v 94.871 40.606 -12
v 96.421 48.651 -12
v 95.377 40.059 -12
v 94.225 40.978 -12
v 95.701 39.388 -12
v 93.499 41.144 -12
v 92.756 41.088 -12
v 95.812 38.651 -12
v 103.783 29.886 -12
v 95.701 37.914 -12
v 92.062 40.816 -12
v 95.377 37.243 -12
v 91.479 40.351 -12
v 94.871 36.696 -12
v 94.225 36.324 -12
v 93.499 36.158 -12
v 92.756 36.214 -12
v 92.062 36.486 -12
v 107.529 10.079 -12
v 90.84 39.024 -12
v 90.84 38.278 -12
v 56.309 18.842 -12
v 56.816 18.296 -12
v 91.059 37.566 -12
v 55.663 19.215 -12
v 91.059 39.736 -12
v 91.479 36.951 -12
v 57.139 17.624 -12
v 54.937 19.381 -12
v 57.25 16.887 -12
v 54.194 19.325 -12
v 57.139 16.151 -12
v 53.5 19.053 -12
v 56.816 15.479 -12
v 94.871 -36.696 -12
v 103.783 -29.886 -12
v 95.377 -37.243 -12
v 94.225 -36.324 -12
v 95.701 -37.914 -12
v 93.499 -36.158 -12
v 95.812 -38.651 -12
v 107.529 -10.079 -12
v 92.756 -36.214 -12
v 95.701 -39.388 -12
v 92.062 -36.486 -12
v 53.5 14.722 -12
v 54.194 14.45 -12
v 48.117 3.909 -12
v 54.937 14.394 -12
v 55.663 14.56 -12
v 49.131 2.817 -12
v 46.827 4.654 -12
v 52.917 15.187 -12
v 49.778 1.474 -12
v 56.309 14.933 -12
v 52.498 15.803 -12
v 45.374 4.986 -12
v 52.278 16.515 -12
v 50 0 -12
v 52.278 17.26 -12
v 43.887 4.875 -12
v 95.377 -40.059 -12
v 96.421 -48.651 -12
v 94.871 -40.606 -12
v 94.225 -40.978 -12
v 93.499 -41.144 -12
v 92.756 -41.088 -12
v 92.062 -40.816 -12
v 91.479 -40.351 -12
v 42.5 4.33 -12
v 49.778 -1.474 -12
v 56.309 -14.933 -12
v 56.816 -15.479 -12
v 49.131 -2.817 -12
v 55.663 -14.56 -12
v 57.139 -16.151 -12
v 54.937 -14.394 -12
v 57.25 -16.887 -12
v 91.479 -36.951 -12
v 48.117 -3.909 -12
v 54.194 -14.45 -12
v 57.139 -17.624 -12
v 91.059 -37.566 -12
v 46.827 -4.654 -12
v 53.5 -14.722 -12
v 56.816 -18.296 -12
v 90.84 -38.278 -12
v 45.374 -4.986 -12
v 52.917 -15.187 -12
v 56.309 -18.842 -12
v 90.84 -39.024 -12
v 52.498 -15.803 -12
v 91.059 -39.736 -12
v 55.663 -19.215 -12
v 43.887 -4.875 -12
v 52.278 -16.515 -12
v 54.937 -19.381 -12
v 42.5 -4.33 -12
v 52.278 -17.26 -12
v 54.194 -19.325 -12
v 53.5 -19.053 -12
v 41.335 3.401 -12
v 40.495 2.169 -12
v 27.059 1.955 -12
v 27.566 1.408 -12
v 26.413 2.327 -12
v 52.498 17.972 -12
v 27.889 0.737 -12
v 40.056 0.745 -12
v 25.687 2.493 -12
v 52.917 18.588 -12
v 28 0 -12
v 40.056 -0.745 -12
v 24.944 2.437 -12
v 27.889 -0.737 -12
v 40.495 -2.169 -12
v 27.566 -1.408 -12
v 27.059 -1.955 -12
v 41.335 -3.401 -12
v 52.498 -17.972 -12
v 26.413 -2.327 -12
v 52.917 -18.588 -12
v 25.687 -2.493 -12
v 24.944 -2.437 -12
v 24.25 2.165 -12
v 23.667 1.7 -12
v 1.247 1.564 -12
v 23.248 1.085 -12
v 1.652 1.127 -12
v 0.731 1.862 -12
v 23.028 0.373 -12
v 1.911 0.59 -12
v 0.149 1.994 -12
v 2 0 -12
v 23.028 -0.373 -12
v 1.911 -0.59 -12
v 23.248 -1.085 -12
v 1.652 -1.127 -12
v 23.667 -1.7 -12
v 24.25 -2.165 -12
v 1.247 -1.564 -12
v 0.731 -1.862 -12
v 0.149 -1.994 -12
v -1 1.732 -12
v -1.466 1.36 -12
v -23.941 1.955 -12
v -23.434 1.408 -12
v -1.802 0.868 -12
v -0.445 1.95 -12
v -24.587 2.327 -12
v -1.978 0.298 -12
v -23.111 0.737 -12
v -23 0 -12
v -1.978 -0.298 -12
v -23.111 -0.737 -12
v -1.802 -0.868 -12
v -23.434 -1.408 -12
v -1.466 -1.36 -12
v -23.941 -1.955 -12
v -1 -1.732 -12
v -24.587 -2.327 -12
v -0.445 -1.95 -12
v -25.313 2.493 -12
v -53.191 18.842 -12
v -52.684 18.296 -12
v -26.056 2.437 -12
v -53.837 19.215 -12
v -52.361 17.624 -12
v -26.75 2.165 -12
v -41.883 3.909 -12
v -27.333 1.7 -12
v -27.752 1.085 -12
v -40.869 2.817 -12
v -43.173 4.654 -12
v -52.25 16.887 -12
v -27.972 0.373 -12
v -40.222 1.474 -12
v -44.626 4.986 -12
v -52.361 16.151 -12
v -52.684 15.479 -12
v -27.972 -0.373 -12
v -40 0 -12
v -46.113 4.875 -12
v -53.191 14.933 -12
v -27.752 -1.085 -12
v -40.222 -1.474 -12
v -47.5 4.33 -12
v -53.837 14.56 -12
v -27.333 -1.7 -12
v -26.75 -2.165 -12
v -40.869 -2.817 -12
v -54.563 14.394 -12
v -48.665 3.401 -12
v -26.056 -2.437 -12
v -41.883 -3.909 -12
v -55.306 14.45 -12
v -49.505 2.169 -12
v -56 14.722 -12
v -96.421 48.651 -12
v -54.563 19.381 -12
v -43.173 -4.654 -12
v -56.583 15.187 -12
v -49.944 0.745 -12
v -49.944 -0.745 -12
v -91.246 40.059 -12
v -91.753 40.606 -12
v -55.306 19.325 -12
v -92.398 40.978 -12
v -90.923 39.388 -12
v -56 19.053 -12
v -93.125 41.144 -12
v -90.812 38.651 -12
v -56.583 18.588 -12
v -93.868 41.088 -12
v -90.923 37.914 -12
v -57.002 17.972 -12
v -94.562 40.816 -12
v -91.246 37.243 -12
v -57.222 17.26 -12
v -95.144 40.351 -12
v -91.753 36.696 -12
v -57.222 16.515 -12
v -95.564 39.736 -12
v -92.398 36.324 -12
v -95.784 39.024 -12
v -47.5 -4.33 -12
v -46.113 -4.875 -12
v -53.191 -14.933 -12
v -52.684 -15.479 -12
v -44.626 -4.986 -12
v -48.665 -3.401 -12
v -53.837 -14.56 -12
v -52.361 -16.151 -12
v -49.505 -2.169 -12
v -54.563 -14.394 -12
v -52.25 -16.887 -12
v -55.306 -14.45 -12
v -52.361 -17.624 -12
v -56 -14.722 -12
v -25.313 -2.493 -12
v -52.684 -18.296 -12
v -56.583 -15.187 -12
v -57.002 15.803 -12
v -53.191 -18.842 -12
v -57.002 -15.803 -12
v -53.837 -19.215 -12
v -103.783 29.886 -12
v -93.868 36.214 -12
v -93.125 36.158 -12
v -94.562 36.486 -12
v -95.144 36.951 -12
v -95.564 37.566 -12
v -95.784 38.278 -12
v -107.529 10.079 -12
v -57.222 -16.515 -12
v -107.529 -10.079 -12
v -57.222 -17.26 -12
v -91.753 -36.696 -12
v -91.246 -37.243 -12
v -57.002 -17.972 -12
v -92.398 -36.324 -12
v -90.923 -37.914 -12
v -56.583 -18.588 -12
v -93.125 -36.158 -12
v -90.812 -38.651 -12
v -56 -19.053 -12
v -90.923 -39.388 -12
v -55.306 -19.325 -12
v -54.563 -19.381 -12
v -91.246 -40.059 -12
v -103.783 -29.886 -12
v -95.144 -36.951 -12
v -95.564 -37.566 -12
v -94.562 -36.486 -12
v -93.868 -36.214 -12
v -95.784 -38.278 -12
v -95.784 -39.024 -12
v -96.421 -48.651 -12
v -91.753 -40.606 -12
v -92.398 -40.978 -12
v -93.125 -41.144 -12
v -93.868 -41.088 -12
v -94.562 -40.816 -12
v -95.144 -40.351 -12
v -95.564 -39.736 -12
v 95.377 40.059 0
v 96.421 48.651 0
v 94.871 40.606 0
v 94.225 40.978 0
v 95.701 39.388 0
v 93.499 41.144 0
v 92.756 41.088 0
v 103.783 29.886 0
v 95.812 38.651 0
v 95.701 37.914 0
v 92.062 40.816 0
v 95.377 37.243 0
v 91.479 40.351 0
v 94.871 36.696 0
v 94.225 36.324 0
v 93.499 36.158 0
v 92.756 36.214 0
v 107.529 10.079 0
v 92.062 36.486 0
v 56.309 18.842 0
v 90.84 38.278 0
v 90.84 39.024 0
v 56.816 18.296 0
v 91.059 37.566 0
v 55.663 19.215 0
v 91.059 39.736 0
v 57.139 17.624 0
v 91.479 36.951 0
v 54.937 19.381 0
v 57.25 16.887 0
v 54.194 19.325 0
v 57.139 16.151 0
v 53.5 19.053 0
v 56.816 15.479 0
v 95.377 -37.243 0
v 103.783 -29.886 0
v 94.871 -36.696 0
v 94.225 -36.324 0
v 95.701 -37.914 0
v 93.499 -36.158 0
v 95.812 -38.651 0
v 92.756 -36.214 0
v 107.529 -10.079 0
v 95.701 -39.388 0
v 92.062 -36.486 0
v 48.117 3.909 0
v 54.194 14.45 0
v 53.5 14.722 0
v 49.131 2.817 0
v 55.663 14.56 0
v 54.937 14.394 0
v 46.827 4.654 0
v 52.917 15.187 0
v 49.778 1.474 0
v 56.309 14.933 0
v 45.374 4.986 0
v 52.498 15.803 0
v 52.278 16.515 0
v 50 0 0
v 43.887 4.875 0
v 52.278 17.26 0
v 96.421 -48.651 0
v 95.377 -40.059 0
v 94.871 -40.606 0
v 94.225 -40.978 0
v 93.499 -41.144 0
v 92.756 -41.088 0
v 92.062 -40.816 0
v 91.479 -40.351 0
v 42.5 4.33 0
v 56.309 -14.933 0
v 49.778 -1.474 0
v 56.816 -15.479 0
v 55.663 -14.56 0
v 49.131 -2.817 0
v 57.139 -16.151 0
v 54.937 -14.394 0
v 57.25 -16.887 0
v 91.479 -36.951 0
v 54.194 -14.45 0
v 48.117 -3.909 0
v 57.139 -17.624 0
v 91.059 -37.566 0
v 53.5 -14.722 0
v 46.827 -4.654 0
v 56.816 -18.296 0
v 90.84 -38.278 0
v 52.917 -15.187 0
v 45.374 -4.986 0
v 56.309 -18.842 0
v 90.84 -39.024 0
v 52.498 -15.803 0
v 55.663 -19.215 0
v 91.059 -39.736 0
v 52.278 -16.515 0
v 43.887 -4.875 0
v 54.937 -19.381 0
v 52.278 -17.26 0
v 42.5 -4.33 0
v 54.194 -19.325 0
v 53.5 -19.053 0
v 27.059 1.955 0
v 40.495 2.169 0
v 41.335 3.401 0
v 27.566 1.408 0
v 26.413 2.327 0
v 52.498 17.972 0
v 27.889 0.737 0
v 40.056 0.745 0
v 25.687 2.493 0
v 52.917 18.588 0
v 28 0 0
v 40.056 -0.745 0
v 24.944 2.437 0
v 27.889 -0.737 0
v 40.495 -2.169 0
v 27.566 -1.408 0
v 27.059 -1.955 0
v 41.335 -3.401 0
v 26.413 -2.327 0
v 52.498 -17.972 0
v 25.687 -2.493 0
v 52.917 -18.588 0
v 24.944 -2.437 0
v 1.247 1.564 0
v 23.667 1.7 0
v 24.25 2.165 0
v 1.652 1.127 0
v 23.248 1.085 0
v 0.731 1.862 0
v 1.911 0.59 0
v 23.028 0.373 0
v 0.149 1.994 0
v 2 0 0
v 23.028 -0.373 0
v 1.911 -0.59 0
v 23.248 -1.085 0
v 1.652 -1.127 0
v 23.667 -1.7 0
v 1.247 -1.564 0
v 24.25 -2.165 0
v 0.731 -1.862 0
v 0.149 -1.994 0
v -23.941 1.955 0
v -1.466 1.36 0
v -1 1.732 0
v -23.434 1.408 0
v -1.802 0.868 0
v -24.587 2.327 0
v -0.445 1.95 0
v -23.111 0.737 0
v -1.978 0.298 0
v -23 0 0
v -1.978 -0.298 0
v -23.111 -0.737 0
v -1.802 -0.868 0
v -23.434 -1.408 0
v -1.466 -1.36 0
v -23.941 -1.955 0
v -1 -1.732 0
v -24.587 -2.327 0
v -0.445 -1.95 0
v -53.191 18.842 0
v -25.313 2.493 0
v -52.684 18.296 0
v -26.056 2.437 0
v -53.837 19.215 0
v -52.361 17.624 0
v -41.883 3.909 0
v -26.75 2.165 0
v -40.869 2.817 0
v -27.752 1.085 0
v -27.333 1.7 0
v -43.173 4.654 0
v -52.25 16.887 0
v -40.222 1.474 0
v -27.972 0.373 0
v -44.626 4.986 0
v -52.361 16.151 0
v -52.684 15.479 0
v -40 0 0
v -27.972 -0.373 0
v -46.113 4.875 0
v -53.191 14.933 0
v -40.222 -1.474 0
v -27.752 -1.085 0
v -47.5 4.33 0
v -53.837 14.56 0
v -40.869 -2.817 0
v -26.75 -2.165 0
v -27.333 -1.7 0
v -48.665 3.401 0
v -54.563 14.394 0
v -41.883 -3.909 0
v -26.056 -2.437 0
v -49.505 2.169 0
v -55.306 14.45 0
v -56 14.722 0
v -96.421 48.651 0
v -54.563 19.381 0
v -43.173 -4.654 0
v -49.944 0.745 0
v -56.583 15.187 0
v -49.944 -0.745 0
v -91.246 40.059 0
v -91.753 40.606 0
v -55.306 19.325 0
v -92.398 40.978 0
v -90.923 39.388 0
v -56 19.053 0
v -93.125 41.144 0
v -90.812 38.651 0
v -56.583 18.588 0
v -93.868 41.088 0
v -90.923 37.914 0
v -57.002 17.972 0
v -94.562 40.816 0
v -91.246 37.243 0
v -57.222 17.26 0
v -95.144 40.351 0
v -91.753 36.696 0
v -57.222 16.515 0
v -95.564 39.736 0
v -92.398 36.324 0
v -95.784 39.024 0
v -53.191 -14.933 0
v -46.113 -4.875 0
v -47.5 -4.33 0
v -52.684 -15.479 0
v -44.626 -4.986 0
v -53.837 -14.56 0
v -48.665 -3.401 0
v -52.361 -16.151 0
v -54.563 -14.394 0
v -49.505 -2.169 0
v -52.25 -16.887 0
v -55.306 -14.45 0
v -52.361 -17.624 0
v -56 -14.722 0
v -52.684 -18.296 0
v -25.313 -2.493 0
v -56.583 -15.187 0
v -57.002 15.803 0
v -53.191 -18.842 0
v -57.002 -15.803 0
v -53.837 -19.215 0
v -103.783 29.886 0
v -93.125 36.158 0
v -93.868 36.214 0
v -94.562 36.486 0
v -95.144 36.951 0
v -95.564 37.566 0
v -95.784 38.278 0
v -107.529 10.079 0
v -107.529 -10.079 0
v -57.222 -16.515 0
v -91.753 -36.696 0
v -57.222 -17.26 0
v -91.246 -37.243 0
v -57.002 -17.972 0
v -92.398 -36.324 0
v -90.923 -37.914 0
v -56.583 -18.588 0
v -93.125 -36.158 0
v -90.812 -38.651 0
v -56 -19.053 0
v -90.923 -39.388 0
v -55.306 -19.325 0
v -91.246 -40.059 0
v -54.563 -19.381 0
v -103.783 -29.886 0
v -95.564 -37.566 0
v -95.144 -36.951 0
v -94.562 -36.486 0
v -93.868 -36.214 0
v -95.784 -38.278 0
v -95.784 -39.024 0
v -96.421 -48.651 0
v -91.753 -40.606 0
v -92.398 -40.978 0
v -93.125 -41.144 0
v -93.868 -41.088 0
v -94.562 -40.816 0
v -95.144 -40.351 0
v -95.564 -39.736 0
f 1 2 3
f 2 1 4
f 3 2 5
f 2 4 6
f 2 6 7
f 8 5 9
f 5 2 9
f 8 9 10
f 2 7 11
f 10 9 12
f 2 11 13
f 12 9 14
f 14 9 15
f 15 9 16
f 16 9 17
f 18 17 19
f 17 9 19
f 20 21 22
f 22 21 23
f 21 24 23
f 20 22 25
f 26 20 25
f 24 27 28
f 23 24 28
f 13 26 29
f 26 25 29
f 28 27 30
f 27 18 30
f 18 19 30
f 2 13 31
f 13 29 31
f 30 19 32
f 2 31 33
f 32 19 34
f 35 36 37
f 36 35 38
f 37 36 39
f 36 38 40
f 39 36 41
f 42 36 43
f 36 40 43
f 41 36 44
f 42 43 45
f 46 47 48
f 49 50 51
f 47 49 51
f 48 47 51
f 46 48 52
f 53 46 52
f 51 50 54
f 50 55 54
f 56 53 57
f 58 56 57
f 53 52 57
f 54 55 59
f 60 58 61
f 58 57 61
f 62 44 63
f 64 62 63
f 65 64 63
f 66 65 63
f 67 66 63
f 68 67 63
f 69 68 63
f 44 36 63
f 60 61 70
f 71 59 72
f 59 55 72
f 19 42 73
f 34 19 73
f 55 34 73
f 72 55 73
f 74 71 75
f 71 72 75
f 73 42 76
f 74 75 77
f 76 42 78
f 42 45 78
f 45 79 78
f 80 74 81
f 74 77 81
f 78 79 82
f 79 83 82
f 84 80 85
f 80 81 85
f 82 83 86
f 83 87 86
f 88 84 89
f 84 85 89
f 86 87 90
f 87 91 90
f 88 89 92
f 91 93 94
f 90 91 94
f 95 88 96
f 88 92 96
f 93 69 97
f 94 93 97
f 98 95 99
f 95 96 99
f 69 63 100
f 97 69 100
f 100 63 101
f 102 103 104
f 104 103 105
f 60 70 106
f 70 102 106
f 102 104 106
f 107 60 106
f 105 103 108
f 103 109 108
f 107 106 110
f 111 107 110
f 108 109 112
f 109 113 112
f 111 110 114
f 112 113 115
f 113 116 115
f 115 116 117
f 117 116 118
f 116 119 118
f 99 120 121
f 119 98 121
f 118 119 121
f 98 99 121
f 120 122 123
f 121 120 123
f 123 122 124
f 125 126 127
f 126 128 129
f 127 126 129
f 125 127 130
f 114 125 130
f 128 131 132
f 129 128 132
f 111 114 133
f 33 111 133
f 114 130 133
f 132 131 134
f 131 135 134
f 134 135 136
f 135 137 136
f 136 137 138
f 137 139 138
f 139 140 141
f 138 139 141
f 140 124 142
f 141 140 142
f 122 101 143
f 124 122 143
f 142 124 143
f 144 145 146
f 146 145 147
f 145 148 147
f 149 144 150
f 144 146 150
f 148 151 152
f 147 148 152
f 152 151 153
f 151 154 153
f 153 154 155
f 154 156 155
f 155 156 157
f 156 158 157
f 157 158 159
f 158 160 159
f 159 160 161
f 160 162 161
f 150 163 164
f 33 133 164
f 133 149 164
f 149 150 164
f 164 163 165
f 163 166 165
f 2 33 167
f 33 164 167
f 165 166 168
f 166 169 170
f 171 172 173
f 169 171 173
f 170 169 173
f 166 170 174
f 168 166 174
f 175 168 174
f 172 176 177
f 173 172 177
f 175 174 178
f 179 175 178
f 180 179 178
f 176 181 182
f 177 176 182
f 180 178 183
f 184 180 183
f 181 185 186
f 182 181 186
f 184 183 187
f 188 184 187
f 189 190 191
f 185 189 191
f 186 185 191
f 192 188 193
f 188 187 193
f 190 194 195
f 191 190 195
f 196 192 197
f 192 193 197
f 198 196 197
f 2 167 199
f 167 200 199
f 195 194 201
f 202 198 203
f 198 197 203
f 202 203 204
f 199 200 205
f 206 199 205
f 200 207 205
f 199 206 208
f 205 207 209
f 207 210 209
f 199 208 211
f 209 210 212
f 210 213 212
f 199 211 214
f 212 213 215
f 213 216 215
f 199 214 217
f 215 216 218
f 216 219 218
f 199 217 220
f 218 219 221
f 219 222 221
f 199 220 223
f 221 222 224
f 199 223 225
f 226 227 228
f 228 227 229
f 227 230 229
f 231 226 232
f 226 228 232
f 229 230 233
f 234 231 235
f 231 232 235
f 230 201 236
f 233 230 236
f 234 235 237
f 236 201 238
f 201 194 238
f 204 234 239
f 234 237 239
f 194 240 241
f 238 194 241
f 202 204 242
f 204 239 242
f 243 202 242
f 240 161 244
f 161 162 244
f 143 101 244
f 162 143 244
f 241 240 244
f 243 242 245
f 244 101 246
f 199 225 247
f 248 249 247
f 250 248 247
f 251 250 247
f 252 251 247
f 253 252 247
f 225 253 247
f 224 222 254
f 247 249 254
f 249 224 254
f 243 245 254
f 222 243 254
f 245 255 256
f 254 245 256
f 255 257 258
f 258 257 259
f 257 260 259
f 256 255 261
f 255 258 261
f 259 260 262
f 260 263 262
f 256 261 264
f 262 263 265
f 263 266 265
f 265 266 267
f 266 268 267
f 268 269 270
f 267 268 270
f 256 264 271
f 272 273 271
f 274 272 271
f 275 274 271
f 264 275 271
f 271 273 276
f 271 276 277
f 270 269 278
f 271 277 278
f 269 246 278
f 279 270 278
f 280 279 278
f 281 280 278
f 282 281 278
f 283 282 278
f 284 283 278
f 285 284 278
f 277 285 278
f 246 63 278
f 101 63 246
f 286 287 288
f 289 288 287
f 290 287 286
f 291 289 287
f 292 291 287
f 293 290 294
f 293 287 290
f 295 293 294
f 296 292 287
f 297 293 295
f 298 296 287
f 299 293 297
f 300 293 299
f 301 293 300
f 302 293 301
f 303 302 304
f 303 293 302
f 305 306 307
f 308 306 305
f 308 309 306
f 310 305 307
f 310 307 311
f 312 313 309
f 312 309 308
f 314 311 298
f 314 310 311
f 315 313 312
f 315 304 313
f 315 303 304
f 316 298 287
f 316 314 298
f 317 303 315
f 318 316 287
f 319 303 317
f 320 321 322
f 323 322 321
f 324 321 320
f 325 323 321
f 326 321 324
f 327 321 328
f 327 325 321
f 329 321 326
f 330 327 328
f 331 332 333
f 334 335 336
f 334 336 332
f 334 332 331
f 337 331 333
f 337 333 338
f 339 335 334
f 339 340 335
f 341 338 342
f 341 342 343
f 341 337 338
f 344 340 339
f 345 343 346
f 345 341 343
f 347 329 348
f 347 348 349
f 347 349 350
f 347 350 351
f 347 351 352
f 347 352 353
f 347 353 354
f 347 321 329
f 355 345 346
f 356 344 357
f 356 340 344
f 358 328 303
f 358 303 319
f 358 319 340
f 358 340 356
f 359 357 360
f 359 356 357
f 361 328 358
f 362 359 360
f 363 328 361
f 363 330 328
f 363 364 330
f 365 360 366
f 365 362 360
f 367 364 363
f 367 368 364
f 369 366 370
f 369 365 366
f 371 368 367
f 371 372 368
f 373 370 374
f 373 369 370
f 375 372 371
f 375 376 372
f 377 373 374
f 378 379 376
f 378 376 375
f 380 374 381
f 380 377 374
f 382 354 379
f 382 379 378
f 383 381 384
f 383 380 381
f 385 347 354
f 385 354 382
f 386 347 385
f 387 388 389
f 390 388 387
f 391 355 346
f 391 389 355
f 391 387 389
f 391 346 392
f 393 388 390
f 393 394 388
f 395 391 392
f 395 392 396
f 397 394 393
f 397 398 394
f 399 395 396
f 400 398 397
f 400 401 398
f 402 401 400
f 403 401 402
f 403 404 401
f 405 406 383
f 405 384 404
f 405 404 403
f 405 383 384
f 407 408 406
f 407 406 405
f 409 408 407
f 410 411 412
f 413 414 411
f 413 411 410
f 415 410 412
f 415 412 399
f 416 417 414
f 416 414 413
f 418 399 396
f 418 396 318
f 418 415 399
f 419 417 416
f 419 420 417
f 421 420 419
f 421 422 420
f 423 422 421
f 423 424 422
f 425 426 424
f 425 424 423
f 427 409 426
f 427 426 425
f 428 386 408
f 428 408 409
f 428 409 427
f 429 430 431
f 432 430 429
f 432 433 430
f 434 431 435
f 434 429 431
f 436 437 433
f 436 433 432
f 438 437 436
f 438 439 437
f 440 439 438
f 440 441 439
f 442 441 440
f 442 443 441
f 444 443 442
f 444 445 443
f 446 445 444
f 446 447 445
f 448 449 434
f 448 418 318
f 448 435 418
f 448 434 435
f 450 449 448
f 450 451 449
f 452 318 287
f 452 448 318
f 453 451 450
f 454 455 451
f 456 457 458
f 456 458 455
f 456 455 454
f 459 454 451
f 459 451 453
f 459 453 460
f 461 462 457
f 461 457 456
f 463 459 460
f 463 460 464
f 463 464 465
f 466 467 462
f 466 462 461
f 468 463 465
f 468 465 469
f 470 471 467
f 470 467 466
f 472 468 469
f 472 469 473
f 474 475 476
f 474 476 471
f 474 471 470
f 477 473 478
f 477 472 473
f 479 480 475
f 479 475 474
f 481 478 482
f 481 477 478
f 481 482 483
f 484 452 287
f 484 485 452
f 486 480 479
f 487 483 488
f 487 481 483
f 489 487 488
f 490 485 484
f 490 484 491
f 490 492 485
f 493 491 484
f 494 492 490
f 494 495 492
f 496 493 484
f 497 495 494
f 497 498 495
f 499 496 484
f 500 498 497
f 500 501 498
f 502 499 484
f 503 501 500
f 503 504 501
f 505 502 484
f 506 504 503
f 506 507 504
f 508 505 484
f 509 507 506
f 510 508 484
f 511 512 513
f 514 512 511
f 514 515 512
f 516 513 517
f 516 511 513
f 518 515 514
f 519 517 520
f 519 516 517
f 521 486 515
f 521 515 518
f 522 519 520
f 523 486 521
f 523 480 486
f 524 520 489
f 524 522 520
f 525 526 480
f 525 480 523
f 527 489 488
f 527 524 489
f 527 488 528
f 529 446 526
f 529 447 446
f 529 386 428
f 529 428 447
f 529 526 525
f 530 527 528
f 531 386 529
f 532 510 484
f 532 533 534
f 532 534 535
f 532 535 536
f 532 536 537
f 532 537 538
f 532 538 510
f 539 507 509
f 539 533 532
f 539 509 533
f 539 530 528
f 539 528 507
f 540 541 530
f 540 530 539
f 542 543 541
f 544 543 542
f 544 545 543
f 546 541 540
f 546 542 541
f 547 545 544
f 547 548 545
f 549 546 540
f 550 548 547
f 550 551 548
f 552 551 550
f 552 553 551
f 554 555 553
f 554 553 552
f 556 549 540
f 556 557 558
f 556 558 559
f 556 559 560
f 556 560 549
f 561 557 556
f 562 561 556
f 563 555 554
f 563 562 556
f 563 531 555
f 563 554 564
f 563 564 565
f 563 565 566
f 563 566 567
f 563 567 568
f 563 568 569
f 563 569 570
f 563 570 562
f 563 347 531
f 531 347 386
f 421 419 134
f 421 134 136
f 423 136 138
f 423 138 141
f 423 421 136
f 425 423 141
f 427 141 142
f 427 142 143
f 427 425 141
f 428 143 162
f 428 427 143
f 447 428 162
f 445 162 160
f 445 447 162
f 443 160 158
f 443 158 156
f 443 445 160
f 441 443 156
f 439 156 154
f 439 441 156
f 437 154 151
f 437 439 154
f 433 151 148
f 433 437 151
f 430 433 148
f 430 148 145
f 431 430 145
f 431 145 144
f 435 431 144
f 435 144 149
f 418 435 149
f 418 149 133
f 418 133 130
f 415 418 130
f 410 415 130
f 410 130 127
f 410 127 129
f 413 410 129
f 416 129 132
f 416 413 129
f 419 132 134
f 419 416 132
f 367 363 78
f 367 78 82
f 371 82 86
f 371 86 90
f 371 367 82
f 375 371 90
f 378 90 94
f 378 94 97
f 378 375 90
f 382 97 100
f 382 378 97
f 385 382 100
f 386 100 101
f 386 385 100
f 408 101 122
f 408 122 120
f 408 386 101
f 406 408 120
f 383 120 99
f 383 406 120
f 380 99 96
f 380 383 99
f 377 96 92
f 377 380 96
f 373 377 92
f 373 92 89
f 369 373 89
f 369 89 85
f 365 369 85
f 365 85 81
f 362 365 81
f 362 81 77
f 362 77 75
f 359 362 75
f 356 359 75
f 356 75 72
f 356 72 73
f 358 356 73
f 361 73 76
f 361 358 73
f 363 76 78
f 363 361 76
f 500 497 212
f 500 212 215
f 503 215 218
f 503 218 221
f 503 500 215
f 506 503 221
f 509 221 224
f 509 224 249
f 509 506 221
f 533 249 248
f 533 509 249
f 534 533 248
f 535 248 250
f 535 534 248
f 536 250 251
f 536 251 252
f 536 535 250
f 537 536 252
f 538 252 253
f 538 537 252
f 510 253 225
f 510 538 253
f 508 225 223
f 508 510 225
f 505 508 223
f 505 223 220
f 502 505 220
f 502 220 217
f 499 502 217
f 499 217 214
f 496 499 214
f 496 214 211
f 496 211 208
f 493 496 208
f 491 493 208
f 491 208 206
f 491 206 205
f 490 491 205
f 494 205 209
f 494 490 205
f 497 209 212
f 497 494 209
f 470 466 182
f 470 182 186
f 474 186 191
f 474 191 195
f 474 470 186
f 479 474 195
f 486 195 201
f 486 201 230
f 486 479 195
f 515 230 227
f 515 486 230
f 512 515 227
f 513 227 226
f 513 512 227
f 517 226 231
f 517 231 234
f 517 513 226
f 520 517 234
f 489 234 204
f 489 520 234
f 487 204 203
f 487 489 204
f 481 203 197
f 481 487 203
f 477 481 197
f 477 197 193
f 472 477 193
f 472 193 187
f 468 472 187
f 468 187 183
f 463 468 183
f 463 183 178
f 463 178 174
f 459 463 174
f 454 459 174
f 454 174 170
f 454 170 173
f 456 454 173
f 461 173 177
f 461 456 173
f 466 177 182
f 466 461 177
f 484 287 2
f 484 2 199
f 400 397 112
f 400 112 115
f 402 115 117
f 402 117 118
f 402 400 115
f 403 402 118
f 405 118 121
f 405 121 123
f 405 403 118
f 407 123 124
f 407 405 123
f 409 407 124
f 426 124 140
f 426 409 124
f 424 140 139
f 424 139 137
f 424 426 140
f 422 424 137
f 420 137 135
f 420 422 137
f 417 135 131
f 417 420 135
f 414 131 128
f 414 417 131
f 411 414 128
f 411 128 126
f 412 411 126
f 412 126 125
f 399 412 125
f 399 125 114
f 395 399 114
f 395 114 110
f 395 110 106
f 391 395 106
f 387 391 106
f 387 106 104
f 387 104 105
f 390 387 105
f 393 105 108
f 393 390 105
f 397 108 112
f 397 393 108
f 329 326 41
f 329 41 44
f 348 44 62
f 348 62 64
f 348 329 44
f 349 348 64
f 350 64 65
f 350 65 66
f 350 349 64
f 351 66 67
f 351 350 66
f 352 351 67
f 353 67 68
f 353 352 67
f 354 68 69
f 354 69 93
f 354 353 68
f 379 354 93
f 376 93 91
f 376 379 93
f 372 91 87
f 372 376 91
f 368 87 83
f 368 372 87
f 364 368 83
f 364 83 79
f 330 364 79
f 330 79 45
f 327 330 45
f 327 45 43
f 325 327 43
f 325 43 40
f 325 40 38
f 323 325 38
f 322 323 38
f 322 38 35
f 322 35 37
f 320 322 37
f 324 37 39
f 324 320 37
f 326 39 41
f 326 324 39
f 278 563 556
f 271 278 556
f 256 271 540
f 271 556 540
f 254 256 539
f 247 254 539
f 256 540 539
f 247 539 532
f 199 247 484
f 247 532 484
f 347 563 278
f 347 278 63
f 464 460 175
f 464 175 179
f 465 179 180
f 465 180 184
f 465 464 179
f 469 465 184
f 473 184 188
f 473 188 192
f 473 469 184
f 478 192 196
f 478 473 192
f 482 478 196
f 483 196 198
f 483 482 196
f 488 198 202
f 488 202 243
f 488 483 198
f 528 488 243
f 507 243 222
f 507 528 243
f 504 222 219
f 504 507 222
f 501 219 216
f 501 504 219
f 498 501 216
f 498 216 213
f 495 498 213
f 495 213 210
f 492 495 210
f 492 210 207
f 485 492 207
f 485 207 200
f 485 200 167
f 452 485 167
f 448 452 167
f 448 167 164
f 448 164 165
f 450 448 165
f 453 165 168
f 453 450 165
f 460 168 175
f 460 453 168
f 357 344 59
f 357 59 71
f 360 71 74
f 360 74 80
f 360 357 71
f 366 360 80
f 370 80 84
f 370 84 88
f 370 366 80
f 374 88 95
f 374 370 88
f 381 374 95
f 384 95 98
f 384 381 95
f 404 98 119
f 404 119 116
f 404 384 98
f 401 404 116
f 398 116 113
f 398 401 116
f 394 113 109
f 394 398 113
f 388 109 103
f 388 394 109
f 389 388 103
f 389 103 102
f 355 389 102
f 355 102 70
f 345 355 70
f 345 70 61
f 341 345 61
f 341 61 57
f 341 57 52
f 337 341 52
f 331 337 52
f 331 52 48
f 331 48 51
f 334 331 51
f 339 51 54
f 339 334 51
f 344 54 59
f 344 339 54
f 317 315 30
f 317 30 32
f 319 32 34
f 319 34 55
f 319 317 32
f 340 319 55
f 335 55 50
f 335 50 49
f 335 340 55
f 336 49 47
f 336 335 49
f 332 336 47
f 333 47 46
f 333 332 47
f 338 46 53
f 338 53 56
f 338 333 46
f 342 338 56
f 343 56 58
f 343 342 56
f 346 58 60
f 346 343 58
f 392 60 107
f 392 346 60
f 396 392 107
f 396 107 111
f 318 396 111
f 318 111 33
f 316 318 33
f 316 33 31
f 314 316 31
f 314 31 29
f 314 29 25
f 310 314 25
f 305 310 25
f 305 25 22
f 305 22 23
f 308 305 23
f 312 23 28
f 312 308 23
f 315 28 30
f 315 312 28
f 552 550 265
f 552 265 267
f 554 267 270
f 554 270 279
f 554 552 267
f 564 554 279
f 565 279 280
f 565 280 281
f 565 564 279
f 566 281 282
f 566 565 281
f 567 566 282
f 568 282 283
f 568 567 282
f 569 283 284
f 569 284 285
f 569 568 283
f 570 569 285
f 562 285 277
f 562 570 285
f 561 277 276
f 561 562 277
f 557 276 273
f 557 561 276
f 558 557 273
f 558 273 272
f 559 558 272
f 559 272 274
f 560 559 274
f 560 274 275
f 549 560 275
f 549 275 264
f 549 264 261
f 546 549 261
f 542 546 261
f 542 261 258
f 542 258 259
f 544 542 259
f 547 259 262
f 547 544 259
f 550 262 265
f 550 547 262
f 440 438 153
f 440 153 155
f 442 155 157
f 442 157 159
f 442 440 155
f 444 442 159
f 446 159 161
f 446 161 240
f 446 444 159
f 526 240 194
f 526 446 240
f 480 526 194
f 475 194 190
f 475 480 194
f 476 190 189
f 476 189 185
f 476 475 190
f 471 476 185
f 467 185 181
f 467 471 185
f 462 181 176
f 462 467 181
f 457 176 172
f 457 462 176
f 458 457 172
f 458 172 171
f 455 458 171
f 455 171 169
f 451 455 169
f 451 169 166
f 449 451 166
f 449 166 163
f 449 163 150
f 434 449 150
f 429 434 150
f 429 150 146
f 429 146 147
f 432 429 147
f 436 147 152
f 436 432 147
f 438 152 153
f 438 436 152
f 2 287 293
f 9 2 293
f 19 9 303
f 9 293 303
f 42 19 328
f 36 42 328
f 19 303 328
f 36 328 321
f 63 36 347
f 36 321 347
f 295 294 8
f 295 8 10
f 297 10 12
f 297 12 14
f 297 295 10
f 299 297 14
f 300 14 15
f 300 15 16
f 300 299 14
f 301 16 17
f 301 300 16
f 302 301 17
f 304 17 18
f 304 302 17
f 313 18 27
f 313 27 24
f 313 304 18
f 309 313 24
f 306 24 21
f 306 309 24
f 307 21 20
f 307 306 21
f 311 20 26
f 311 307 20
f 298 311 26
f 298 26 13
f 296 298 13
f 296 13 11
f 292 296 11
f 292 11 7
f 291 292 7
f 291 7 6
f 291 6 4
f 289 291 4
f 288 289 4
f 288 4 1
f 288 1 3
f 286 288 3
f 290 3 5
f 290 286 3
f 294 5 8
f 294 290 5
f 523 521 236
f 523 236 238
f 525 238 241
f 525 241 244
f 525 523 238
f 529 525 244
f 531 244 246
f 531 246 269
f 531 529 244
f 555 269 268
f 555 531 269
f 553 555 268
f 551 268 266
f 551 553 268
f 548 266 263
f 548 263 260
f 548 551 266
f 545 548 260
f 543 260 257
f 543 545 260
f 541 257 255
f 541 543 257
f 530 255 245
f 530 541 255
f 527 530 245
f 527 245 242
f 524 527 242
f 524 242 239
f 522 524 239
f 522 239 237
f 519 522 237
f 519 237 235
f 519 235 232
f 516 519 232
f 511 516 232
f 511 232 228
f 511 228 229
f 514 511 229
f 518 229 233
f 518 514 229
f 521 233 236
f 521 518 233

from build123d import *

# Parameters (mm, degrees)
SKETCH001_R   = 2.5
SKETCH001_R_2 = 5
SKETCH001_R_3 = 2
PAD_DEPTH     = 12


with BuildPart() as part:
    # Sketch001 → Pad (new body)
    with BuildSketch(Plane(origin=(0, 0, 0), x_dir=(1, 0, 0), z_dir=(0, 0, -1))):
        with BuildLine():
            Line((-96.421355, 48.651027), (96.421355, 48.651027))
            ThreePointArc((96.421355, -48.651027), (108, 0), (96.421355, 48.651027))
            Line((96.421355, -48.651027), (-96.421355, -48.651027))
            ThreePointArc((-96.421355, 48.651027), (-108, 0), (-96.421355, -48.651027))
        make_face()
        with Locations((93.311833, 38.651027)):
            Circle(SKETCH001_R, mode=Mode.SUBTRACT)
        with Locations((93.311833, -38.651027)):
            Circle(SKETCH001_R, mode=Mode.SUBTRACT)
        with Locations((-93.311833, 38.651027)):
            Circle(SKETCH001_R, mode=Mode.SUBTRACT)
        with Locations((-93.311833, -38.651027)):
            Circle(SKETCH001_R, mode=Mode.SUBTRACT)
        with Locations((-45, 0)):
            Circle(SKETCH001_R_2, mode=Mode.SUBTRACT)
        with Locations((45, 0)):
            Circle(SKETCH001_R_2, mode=Mode.SUBTRACT)
        with Locations((54.75, 16.887495)):
            Circle(SKETCH001_R, mode=Mode.SUBTRACT)
        with Locations((25.5, 0)):
            Circle(SKETCH001_R, mode=Mode.SUBTRACT)
        with Locations((54.75, -16.887495)):
            Circle(SKETCH001_R, mode=Mode.SUBTRACT)
        with Locations((-54.75, 16.887495)):
            Circle(SKETCH001_R, mode=Mode.SUBTRACT)
        with Locations((-25.5, 0)):
            Circle(SKETCH001_R, mode=Mode.SUBTRACT)
        with Locations((-54.75, -16.887495)):
            Circle(SKETCH001_R, mode=Mode.SUBTRACT)
        Circle(SKETCH001_R_3, mode=Mode.SUBTRACT)
    extrude(amount=PAD_DEPTH)


solid = part.part
